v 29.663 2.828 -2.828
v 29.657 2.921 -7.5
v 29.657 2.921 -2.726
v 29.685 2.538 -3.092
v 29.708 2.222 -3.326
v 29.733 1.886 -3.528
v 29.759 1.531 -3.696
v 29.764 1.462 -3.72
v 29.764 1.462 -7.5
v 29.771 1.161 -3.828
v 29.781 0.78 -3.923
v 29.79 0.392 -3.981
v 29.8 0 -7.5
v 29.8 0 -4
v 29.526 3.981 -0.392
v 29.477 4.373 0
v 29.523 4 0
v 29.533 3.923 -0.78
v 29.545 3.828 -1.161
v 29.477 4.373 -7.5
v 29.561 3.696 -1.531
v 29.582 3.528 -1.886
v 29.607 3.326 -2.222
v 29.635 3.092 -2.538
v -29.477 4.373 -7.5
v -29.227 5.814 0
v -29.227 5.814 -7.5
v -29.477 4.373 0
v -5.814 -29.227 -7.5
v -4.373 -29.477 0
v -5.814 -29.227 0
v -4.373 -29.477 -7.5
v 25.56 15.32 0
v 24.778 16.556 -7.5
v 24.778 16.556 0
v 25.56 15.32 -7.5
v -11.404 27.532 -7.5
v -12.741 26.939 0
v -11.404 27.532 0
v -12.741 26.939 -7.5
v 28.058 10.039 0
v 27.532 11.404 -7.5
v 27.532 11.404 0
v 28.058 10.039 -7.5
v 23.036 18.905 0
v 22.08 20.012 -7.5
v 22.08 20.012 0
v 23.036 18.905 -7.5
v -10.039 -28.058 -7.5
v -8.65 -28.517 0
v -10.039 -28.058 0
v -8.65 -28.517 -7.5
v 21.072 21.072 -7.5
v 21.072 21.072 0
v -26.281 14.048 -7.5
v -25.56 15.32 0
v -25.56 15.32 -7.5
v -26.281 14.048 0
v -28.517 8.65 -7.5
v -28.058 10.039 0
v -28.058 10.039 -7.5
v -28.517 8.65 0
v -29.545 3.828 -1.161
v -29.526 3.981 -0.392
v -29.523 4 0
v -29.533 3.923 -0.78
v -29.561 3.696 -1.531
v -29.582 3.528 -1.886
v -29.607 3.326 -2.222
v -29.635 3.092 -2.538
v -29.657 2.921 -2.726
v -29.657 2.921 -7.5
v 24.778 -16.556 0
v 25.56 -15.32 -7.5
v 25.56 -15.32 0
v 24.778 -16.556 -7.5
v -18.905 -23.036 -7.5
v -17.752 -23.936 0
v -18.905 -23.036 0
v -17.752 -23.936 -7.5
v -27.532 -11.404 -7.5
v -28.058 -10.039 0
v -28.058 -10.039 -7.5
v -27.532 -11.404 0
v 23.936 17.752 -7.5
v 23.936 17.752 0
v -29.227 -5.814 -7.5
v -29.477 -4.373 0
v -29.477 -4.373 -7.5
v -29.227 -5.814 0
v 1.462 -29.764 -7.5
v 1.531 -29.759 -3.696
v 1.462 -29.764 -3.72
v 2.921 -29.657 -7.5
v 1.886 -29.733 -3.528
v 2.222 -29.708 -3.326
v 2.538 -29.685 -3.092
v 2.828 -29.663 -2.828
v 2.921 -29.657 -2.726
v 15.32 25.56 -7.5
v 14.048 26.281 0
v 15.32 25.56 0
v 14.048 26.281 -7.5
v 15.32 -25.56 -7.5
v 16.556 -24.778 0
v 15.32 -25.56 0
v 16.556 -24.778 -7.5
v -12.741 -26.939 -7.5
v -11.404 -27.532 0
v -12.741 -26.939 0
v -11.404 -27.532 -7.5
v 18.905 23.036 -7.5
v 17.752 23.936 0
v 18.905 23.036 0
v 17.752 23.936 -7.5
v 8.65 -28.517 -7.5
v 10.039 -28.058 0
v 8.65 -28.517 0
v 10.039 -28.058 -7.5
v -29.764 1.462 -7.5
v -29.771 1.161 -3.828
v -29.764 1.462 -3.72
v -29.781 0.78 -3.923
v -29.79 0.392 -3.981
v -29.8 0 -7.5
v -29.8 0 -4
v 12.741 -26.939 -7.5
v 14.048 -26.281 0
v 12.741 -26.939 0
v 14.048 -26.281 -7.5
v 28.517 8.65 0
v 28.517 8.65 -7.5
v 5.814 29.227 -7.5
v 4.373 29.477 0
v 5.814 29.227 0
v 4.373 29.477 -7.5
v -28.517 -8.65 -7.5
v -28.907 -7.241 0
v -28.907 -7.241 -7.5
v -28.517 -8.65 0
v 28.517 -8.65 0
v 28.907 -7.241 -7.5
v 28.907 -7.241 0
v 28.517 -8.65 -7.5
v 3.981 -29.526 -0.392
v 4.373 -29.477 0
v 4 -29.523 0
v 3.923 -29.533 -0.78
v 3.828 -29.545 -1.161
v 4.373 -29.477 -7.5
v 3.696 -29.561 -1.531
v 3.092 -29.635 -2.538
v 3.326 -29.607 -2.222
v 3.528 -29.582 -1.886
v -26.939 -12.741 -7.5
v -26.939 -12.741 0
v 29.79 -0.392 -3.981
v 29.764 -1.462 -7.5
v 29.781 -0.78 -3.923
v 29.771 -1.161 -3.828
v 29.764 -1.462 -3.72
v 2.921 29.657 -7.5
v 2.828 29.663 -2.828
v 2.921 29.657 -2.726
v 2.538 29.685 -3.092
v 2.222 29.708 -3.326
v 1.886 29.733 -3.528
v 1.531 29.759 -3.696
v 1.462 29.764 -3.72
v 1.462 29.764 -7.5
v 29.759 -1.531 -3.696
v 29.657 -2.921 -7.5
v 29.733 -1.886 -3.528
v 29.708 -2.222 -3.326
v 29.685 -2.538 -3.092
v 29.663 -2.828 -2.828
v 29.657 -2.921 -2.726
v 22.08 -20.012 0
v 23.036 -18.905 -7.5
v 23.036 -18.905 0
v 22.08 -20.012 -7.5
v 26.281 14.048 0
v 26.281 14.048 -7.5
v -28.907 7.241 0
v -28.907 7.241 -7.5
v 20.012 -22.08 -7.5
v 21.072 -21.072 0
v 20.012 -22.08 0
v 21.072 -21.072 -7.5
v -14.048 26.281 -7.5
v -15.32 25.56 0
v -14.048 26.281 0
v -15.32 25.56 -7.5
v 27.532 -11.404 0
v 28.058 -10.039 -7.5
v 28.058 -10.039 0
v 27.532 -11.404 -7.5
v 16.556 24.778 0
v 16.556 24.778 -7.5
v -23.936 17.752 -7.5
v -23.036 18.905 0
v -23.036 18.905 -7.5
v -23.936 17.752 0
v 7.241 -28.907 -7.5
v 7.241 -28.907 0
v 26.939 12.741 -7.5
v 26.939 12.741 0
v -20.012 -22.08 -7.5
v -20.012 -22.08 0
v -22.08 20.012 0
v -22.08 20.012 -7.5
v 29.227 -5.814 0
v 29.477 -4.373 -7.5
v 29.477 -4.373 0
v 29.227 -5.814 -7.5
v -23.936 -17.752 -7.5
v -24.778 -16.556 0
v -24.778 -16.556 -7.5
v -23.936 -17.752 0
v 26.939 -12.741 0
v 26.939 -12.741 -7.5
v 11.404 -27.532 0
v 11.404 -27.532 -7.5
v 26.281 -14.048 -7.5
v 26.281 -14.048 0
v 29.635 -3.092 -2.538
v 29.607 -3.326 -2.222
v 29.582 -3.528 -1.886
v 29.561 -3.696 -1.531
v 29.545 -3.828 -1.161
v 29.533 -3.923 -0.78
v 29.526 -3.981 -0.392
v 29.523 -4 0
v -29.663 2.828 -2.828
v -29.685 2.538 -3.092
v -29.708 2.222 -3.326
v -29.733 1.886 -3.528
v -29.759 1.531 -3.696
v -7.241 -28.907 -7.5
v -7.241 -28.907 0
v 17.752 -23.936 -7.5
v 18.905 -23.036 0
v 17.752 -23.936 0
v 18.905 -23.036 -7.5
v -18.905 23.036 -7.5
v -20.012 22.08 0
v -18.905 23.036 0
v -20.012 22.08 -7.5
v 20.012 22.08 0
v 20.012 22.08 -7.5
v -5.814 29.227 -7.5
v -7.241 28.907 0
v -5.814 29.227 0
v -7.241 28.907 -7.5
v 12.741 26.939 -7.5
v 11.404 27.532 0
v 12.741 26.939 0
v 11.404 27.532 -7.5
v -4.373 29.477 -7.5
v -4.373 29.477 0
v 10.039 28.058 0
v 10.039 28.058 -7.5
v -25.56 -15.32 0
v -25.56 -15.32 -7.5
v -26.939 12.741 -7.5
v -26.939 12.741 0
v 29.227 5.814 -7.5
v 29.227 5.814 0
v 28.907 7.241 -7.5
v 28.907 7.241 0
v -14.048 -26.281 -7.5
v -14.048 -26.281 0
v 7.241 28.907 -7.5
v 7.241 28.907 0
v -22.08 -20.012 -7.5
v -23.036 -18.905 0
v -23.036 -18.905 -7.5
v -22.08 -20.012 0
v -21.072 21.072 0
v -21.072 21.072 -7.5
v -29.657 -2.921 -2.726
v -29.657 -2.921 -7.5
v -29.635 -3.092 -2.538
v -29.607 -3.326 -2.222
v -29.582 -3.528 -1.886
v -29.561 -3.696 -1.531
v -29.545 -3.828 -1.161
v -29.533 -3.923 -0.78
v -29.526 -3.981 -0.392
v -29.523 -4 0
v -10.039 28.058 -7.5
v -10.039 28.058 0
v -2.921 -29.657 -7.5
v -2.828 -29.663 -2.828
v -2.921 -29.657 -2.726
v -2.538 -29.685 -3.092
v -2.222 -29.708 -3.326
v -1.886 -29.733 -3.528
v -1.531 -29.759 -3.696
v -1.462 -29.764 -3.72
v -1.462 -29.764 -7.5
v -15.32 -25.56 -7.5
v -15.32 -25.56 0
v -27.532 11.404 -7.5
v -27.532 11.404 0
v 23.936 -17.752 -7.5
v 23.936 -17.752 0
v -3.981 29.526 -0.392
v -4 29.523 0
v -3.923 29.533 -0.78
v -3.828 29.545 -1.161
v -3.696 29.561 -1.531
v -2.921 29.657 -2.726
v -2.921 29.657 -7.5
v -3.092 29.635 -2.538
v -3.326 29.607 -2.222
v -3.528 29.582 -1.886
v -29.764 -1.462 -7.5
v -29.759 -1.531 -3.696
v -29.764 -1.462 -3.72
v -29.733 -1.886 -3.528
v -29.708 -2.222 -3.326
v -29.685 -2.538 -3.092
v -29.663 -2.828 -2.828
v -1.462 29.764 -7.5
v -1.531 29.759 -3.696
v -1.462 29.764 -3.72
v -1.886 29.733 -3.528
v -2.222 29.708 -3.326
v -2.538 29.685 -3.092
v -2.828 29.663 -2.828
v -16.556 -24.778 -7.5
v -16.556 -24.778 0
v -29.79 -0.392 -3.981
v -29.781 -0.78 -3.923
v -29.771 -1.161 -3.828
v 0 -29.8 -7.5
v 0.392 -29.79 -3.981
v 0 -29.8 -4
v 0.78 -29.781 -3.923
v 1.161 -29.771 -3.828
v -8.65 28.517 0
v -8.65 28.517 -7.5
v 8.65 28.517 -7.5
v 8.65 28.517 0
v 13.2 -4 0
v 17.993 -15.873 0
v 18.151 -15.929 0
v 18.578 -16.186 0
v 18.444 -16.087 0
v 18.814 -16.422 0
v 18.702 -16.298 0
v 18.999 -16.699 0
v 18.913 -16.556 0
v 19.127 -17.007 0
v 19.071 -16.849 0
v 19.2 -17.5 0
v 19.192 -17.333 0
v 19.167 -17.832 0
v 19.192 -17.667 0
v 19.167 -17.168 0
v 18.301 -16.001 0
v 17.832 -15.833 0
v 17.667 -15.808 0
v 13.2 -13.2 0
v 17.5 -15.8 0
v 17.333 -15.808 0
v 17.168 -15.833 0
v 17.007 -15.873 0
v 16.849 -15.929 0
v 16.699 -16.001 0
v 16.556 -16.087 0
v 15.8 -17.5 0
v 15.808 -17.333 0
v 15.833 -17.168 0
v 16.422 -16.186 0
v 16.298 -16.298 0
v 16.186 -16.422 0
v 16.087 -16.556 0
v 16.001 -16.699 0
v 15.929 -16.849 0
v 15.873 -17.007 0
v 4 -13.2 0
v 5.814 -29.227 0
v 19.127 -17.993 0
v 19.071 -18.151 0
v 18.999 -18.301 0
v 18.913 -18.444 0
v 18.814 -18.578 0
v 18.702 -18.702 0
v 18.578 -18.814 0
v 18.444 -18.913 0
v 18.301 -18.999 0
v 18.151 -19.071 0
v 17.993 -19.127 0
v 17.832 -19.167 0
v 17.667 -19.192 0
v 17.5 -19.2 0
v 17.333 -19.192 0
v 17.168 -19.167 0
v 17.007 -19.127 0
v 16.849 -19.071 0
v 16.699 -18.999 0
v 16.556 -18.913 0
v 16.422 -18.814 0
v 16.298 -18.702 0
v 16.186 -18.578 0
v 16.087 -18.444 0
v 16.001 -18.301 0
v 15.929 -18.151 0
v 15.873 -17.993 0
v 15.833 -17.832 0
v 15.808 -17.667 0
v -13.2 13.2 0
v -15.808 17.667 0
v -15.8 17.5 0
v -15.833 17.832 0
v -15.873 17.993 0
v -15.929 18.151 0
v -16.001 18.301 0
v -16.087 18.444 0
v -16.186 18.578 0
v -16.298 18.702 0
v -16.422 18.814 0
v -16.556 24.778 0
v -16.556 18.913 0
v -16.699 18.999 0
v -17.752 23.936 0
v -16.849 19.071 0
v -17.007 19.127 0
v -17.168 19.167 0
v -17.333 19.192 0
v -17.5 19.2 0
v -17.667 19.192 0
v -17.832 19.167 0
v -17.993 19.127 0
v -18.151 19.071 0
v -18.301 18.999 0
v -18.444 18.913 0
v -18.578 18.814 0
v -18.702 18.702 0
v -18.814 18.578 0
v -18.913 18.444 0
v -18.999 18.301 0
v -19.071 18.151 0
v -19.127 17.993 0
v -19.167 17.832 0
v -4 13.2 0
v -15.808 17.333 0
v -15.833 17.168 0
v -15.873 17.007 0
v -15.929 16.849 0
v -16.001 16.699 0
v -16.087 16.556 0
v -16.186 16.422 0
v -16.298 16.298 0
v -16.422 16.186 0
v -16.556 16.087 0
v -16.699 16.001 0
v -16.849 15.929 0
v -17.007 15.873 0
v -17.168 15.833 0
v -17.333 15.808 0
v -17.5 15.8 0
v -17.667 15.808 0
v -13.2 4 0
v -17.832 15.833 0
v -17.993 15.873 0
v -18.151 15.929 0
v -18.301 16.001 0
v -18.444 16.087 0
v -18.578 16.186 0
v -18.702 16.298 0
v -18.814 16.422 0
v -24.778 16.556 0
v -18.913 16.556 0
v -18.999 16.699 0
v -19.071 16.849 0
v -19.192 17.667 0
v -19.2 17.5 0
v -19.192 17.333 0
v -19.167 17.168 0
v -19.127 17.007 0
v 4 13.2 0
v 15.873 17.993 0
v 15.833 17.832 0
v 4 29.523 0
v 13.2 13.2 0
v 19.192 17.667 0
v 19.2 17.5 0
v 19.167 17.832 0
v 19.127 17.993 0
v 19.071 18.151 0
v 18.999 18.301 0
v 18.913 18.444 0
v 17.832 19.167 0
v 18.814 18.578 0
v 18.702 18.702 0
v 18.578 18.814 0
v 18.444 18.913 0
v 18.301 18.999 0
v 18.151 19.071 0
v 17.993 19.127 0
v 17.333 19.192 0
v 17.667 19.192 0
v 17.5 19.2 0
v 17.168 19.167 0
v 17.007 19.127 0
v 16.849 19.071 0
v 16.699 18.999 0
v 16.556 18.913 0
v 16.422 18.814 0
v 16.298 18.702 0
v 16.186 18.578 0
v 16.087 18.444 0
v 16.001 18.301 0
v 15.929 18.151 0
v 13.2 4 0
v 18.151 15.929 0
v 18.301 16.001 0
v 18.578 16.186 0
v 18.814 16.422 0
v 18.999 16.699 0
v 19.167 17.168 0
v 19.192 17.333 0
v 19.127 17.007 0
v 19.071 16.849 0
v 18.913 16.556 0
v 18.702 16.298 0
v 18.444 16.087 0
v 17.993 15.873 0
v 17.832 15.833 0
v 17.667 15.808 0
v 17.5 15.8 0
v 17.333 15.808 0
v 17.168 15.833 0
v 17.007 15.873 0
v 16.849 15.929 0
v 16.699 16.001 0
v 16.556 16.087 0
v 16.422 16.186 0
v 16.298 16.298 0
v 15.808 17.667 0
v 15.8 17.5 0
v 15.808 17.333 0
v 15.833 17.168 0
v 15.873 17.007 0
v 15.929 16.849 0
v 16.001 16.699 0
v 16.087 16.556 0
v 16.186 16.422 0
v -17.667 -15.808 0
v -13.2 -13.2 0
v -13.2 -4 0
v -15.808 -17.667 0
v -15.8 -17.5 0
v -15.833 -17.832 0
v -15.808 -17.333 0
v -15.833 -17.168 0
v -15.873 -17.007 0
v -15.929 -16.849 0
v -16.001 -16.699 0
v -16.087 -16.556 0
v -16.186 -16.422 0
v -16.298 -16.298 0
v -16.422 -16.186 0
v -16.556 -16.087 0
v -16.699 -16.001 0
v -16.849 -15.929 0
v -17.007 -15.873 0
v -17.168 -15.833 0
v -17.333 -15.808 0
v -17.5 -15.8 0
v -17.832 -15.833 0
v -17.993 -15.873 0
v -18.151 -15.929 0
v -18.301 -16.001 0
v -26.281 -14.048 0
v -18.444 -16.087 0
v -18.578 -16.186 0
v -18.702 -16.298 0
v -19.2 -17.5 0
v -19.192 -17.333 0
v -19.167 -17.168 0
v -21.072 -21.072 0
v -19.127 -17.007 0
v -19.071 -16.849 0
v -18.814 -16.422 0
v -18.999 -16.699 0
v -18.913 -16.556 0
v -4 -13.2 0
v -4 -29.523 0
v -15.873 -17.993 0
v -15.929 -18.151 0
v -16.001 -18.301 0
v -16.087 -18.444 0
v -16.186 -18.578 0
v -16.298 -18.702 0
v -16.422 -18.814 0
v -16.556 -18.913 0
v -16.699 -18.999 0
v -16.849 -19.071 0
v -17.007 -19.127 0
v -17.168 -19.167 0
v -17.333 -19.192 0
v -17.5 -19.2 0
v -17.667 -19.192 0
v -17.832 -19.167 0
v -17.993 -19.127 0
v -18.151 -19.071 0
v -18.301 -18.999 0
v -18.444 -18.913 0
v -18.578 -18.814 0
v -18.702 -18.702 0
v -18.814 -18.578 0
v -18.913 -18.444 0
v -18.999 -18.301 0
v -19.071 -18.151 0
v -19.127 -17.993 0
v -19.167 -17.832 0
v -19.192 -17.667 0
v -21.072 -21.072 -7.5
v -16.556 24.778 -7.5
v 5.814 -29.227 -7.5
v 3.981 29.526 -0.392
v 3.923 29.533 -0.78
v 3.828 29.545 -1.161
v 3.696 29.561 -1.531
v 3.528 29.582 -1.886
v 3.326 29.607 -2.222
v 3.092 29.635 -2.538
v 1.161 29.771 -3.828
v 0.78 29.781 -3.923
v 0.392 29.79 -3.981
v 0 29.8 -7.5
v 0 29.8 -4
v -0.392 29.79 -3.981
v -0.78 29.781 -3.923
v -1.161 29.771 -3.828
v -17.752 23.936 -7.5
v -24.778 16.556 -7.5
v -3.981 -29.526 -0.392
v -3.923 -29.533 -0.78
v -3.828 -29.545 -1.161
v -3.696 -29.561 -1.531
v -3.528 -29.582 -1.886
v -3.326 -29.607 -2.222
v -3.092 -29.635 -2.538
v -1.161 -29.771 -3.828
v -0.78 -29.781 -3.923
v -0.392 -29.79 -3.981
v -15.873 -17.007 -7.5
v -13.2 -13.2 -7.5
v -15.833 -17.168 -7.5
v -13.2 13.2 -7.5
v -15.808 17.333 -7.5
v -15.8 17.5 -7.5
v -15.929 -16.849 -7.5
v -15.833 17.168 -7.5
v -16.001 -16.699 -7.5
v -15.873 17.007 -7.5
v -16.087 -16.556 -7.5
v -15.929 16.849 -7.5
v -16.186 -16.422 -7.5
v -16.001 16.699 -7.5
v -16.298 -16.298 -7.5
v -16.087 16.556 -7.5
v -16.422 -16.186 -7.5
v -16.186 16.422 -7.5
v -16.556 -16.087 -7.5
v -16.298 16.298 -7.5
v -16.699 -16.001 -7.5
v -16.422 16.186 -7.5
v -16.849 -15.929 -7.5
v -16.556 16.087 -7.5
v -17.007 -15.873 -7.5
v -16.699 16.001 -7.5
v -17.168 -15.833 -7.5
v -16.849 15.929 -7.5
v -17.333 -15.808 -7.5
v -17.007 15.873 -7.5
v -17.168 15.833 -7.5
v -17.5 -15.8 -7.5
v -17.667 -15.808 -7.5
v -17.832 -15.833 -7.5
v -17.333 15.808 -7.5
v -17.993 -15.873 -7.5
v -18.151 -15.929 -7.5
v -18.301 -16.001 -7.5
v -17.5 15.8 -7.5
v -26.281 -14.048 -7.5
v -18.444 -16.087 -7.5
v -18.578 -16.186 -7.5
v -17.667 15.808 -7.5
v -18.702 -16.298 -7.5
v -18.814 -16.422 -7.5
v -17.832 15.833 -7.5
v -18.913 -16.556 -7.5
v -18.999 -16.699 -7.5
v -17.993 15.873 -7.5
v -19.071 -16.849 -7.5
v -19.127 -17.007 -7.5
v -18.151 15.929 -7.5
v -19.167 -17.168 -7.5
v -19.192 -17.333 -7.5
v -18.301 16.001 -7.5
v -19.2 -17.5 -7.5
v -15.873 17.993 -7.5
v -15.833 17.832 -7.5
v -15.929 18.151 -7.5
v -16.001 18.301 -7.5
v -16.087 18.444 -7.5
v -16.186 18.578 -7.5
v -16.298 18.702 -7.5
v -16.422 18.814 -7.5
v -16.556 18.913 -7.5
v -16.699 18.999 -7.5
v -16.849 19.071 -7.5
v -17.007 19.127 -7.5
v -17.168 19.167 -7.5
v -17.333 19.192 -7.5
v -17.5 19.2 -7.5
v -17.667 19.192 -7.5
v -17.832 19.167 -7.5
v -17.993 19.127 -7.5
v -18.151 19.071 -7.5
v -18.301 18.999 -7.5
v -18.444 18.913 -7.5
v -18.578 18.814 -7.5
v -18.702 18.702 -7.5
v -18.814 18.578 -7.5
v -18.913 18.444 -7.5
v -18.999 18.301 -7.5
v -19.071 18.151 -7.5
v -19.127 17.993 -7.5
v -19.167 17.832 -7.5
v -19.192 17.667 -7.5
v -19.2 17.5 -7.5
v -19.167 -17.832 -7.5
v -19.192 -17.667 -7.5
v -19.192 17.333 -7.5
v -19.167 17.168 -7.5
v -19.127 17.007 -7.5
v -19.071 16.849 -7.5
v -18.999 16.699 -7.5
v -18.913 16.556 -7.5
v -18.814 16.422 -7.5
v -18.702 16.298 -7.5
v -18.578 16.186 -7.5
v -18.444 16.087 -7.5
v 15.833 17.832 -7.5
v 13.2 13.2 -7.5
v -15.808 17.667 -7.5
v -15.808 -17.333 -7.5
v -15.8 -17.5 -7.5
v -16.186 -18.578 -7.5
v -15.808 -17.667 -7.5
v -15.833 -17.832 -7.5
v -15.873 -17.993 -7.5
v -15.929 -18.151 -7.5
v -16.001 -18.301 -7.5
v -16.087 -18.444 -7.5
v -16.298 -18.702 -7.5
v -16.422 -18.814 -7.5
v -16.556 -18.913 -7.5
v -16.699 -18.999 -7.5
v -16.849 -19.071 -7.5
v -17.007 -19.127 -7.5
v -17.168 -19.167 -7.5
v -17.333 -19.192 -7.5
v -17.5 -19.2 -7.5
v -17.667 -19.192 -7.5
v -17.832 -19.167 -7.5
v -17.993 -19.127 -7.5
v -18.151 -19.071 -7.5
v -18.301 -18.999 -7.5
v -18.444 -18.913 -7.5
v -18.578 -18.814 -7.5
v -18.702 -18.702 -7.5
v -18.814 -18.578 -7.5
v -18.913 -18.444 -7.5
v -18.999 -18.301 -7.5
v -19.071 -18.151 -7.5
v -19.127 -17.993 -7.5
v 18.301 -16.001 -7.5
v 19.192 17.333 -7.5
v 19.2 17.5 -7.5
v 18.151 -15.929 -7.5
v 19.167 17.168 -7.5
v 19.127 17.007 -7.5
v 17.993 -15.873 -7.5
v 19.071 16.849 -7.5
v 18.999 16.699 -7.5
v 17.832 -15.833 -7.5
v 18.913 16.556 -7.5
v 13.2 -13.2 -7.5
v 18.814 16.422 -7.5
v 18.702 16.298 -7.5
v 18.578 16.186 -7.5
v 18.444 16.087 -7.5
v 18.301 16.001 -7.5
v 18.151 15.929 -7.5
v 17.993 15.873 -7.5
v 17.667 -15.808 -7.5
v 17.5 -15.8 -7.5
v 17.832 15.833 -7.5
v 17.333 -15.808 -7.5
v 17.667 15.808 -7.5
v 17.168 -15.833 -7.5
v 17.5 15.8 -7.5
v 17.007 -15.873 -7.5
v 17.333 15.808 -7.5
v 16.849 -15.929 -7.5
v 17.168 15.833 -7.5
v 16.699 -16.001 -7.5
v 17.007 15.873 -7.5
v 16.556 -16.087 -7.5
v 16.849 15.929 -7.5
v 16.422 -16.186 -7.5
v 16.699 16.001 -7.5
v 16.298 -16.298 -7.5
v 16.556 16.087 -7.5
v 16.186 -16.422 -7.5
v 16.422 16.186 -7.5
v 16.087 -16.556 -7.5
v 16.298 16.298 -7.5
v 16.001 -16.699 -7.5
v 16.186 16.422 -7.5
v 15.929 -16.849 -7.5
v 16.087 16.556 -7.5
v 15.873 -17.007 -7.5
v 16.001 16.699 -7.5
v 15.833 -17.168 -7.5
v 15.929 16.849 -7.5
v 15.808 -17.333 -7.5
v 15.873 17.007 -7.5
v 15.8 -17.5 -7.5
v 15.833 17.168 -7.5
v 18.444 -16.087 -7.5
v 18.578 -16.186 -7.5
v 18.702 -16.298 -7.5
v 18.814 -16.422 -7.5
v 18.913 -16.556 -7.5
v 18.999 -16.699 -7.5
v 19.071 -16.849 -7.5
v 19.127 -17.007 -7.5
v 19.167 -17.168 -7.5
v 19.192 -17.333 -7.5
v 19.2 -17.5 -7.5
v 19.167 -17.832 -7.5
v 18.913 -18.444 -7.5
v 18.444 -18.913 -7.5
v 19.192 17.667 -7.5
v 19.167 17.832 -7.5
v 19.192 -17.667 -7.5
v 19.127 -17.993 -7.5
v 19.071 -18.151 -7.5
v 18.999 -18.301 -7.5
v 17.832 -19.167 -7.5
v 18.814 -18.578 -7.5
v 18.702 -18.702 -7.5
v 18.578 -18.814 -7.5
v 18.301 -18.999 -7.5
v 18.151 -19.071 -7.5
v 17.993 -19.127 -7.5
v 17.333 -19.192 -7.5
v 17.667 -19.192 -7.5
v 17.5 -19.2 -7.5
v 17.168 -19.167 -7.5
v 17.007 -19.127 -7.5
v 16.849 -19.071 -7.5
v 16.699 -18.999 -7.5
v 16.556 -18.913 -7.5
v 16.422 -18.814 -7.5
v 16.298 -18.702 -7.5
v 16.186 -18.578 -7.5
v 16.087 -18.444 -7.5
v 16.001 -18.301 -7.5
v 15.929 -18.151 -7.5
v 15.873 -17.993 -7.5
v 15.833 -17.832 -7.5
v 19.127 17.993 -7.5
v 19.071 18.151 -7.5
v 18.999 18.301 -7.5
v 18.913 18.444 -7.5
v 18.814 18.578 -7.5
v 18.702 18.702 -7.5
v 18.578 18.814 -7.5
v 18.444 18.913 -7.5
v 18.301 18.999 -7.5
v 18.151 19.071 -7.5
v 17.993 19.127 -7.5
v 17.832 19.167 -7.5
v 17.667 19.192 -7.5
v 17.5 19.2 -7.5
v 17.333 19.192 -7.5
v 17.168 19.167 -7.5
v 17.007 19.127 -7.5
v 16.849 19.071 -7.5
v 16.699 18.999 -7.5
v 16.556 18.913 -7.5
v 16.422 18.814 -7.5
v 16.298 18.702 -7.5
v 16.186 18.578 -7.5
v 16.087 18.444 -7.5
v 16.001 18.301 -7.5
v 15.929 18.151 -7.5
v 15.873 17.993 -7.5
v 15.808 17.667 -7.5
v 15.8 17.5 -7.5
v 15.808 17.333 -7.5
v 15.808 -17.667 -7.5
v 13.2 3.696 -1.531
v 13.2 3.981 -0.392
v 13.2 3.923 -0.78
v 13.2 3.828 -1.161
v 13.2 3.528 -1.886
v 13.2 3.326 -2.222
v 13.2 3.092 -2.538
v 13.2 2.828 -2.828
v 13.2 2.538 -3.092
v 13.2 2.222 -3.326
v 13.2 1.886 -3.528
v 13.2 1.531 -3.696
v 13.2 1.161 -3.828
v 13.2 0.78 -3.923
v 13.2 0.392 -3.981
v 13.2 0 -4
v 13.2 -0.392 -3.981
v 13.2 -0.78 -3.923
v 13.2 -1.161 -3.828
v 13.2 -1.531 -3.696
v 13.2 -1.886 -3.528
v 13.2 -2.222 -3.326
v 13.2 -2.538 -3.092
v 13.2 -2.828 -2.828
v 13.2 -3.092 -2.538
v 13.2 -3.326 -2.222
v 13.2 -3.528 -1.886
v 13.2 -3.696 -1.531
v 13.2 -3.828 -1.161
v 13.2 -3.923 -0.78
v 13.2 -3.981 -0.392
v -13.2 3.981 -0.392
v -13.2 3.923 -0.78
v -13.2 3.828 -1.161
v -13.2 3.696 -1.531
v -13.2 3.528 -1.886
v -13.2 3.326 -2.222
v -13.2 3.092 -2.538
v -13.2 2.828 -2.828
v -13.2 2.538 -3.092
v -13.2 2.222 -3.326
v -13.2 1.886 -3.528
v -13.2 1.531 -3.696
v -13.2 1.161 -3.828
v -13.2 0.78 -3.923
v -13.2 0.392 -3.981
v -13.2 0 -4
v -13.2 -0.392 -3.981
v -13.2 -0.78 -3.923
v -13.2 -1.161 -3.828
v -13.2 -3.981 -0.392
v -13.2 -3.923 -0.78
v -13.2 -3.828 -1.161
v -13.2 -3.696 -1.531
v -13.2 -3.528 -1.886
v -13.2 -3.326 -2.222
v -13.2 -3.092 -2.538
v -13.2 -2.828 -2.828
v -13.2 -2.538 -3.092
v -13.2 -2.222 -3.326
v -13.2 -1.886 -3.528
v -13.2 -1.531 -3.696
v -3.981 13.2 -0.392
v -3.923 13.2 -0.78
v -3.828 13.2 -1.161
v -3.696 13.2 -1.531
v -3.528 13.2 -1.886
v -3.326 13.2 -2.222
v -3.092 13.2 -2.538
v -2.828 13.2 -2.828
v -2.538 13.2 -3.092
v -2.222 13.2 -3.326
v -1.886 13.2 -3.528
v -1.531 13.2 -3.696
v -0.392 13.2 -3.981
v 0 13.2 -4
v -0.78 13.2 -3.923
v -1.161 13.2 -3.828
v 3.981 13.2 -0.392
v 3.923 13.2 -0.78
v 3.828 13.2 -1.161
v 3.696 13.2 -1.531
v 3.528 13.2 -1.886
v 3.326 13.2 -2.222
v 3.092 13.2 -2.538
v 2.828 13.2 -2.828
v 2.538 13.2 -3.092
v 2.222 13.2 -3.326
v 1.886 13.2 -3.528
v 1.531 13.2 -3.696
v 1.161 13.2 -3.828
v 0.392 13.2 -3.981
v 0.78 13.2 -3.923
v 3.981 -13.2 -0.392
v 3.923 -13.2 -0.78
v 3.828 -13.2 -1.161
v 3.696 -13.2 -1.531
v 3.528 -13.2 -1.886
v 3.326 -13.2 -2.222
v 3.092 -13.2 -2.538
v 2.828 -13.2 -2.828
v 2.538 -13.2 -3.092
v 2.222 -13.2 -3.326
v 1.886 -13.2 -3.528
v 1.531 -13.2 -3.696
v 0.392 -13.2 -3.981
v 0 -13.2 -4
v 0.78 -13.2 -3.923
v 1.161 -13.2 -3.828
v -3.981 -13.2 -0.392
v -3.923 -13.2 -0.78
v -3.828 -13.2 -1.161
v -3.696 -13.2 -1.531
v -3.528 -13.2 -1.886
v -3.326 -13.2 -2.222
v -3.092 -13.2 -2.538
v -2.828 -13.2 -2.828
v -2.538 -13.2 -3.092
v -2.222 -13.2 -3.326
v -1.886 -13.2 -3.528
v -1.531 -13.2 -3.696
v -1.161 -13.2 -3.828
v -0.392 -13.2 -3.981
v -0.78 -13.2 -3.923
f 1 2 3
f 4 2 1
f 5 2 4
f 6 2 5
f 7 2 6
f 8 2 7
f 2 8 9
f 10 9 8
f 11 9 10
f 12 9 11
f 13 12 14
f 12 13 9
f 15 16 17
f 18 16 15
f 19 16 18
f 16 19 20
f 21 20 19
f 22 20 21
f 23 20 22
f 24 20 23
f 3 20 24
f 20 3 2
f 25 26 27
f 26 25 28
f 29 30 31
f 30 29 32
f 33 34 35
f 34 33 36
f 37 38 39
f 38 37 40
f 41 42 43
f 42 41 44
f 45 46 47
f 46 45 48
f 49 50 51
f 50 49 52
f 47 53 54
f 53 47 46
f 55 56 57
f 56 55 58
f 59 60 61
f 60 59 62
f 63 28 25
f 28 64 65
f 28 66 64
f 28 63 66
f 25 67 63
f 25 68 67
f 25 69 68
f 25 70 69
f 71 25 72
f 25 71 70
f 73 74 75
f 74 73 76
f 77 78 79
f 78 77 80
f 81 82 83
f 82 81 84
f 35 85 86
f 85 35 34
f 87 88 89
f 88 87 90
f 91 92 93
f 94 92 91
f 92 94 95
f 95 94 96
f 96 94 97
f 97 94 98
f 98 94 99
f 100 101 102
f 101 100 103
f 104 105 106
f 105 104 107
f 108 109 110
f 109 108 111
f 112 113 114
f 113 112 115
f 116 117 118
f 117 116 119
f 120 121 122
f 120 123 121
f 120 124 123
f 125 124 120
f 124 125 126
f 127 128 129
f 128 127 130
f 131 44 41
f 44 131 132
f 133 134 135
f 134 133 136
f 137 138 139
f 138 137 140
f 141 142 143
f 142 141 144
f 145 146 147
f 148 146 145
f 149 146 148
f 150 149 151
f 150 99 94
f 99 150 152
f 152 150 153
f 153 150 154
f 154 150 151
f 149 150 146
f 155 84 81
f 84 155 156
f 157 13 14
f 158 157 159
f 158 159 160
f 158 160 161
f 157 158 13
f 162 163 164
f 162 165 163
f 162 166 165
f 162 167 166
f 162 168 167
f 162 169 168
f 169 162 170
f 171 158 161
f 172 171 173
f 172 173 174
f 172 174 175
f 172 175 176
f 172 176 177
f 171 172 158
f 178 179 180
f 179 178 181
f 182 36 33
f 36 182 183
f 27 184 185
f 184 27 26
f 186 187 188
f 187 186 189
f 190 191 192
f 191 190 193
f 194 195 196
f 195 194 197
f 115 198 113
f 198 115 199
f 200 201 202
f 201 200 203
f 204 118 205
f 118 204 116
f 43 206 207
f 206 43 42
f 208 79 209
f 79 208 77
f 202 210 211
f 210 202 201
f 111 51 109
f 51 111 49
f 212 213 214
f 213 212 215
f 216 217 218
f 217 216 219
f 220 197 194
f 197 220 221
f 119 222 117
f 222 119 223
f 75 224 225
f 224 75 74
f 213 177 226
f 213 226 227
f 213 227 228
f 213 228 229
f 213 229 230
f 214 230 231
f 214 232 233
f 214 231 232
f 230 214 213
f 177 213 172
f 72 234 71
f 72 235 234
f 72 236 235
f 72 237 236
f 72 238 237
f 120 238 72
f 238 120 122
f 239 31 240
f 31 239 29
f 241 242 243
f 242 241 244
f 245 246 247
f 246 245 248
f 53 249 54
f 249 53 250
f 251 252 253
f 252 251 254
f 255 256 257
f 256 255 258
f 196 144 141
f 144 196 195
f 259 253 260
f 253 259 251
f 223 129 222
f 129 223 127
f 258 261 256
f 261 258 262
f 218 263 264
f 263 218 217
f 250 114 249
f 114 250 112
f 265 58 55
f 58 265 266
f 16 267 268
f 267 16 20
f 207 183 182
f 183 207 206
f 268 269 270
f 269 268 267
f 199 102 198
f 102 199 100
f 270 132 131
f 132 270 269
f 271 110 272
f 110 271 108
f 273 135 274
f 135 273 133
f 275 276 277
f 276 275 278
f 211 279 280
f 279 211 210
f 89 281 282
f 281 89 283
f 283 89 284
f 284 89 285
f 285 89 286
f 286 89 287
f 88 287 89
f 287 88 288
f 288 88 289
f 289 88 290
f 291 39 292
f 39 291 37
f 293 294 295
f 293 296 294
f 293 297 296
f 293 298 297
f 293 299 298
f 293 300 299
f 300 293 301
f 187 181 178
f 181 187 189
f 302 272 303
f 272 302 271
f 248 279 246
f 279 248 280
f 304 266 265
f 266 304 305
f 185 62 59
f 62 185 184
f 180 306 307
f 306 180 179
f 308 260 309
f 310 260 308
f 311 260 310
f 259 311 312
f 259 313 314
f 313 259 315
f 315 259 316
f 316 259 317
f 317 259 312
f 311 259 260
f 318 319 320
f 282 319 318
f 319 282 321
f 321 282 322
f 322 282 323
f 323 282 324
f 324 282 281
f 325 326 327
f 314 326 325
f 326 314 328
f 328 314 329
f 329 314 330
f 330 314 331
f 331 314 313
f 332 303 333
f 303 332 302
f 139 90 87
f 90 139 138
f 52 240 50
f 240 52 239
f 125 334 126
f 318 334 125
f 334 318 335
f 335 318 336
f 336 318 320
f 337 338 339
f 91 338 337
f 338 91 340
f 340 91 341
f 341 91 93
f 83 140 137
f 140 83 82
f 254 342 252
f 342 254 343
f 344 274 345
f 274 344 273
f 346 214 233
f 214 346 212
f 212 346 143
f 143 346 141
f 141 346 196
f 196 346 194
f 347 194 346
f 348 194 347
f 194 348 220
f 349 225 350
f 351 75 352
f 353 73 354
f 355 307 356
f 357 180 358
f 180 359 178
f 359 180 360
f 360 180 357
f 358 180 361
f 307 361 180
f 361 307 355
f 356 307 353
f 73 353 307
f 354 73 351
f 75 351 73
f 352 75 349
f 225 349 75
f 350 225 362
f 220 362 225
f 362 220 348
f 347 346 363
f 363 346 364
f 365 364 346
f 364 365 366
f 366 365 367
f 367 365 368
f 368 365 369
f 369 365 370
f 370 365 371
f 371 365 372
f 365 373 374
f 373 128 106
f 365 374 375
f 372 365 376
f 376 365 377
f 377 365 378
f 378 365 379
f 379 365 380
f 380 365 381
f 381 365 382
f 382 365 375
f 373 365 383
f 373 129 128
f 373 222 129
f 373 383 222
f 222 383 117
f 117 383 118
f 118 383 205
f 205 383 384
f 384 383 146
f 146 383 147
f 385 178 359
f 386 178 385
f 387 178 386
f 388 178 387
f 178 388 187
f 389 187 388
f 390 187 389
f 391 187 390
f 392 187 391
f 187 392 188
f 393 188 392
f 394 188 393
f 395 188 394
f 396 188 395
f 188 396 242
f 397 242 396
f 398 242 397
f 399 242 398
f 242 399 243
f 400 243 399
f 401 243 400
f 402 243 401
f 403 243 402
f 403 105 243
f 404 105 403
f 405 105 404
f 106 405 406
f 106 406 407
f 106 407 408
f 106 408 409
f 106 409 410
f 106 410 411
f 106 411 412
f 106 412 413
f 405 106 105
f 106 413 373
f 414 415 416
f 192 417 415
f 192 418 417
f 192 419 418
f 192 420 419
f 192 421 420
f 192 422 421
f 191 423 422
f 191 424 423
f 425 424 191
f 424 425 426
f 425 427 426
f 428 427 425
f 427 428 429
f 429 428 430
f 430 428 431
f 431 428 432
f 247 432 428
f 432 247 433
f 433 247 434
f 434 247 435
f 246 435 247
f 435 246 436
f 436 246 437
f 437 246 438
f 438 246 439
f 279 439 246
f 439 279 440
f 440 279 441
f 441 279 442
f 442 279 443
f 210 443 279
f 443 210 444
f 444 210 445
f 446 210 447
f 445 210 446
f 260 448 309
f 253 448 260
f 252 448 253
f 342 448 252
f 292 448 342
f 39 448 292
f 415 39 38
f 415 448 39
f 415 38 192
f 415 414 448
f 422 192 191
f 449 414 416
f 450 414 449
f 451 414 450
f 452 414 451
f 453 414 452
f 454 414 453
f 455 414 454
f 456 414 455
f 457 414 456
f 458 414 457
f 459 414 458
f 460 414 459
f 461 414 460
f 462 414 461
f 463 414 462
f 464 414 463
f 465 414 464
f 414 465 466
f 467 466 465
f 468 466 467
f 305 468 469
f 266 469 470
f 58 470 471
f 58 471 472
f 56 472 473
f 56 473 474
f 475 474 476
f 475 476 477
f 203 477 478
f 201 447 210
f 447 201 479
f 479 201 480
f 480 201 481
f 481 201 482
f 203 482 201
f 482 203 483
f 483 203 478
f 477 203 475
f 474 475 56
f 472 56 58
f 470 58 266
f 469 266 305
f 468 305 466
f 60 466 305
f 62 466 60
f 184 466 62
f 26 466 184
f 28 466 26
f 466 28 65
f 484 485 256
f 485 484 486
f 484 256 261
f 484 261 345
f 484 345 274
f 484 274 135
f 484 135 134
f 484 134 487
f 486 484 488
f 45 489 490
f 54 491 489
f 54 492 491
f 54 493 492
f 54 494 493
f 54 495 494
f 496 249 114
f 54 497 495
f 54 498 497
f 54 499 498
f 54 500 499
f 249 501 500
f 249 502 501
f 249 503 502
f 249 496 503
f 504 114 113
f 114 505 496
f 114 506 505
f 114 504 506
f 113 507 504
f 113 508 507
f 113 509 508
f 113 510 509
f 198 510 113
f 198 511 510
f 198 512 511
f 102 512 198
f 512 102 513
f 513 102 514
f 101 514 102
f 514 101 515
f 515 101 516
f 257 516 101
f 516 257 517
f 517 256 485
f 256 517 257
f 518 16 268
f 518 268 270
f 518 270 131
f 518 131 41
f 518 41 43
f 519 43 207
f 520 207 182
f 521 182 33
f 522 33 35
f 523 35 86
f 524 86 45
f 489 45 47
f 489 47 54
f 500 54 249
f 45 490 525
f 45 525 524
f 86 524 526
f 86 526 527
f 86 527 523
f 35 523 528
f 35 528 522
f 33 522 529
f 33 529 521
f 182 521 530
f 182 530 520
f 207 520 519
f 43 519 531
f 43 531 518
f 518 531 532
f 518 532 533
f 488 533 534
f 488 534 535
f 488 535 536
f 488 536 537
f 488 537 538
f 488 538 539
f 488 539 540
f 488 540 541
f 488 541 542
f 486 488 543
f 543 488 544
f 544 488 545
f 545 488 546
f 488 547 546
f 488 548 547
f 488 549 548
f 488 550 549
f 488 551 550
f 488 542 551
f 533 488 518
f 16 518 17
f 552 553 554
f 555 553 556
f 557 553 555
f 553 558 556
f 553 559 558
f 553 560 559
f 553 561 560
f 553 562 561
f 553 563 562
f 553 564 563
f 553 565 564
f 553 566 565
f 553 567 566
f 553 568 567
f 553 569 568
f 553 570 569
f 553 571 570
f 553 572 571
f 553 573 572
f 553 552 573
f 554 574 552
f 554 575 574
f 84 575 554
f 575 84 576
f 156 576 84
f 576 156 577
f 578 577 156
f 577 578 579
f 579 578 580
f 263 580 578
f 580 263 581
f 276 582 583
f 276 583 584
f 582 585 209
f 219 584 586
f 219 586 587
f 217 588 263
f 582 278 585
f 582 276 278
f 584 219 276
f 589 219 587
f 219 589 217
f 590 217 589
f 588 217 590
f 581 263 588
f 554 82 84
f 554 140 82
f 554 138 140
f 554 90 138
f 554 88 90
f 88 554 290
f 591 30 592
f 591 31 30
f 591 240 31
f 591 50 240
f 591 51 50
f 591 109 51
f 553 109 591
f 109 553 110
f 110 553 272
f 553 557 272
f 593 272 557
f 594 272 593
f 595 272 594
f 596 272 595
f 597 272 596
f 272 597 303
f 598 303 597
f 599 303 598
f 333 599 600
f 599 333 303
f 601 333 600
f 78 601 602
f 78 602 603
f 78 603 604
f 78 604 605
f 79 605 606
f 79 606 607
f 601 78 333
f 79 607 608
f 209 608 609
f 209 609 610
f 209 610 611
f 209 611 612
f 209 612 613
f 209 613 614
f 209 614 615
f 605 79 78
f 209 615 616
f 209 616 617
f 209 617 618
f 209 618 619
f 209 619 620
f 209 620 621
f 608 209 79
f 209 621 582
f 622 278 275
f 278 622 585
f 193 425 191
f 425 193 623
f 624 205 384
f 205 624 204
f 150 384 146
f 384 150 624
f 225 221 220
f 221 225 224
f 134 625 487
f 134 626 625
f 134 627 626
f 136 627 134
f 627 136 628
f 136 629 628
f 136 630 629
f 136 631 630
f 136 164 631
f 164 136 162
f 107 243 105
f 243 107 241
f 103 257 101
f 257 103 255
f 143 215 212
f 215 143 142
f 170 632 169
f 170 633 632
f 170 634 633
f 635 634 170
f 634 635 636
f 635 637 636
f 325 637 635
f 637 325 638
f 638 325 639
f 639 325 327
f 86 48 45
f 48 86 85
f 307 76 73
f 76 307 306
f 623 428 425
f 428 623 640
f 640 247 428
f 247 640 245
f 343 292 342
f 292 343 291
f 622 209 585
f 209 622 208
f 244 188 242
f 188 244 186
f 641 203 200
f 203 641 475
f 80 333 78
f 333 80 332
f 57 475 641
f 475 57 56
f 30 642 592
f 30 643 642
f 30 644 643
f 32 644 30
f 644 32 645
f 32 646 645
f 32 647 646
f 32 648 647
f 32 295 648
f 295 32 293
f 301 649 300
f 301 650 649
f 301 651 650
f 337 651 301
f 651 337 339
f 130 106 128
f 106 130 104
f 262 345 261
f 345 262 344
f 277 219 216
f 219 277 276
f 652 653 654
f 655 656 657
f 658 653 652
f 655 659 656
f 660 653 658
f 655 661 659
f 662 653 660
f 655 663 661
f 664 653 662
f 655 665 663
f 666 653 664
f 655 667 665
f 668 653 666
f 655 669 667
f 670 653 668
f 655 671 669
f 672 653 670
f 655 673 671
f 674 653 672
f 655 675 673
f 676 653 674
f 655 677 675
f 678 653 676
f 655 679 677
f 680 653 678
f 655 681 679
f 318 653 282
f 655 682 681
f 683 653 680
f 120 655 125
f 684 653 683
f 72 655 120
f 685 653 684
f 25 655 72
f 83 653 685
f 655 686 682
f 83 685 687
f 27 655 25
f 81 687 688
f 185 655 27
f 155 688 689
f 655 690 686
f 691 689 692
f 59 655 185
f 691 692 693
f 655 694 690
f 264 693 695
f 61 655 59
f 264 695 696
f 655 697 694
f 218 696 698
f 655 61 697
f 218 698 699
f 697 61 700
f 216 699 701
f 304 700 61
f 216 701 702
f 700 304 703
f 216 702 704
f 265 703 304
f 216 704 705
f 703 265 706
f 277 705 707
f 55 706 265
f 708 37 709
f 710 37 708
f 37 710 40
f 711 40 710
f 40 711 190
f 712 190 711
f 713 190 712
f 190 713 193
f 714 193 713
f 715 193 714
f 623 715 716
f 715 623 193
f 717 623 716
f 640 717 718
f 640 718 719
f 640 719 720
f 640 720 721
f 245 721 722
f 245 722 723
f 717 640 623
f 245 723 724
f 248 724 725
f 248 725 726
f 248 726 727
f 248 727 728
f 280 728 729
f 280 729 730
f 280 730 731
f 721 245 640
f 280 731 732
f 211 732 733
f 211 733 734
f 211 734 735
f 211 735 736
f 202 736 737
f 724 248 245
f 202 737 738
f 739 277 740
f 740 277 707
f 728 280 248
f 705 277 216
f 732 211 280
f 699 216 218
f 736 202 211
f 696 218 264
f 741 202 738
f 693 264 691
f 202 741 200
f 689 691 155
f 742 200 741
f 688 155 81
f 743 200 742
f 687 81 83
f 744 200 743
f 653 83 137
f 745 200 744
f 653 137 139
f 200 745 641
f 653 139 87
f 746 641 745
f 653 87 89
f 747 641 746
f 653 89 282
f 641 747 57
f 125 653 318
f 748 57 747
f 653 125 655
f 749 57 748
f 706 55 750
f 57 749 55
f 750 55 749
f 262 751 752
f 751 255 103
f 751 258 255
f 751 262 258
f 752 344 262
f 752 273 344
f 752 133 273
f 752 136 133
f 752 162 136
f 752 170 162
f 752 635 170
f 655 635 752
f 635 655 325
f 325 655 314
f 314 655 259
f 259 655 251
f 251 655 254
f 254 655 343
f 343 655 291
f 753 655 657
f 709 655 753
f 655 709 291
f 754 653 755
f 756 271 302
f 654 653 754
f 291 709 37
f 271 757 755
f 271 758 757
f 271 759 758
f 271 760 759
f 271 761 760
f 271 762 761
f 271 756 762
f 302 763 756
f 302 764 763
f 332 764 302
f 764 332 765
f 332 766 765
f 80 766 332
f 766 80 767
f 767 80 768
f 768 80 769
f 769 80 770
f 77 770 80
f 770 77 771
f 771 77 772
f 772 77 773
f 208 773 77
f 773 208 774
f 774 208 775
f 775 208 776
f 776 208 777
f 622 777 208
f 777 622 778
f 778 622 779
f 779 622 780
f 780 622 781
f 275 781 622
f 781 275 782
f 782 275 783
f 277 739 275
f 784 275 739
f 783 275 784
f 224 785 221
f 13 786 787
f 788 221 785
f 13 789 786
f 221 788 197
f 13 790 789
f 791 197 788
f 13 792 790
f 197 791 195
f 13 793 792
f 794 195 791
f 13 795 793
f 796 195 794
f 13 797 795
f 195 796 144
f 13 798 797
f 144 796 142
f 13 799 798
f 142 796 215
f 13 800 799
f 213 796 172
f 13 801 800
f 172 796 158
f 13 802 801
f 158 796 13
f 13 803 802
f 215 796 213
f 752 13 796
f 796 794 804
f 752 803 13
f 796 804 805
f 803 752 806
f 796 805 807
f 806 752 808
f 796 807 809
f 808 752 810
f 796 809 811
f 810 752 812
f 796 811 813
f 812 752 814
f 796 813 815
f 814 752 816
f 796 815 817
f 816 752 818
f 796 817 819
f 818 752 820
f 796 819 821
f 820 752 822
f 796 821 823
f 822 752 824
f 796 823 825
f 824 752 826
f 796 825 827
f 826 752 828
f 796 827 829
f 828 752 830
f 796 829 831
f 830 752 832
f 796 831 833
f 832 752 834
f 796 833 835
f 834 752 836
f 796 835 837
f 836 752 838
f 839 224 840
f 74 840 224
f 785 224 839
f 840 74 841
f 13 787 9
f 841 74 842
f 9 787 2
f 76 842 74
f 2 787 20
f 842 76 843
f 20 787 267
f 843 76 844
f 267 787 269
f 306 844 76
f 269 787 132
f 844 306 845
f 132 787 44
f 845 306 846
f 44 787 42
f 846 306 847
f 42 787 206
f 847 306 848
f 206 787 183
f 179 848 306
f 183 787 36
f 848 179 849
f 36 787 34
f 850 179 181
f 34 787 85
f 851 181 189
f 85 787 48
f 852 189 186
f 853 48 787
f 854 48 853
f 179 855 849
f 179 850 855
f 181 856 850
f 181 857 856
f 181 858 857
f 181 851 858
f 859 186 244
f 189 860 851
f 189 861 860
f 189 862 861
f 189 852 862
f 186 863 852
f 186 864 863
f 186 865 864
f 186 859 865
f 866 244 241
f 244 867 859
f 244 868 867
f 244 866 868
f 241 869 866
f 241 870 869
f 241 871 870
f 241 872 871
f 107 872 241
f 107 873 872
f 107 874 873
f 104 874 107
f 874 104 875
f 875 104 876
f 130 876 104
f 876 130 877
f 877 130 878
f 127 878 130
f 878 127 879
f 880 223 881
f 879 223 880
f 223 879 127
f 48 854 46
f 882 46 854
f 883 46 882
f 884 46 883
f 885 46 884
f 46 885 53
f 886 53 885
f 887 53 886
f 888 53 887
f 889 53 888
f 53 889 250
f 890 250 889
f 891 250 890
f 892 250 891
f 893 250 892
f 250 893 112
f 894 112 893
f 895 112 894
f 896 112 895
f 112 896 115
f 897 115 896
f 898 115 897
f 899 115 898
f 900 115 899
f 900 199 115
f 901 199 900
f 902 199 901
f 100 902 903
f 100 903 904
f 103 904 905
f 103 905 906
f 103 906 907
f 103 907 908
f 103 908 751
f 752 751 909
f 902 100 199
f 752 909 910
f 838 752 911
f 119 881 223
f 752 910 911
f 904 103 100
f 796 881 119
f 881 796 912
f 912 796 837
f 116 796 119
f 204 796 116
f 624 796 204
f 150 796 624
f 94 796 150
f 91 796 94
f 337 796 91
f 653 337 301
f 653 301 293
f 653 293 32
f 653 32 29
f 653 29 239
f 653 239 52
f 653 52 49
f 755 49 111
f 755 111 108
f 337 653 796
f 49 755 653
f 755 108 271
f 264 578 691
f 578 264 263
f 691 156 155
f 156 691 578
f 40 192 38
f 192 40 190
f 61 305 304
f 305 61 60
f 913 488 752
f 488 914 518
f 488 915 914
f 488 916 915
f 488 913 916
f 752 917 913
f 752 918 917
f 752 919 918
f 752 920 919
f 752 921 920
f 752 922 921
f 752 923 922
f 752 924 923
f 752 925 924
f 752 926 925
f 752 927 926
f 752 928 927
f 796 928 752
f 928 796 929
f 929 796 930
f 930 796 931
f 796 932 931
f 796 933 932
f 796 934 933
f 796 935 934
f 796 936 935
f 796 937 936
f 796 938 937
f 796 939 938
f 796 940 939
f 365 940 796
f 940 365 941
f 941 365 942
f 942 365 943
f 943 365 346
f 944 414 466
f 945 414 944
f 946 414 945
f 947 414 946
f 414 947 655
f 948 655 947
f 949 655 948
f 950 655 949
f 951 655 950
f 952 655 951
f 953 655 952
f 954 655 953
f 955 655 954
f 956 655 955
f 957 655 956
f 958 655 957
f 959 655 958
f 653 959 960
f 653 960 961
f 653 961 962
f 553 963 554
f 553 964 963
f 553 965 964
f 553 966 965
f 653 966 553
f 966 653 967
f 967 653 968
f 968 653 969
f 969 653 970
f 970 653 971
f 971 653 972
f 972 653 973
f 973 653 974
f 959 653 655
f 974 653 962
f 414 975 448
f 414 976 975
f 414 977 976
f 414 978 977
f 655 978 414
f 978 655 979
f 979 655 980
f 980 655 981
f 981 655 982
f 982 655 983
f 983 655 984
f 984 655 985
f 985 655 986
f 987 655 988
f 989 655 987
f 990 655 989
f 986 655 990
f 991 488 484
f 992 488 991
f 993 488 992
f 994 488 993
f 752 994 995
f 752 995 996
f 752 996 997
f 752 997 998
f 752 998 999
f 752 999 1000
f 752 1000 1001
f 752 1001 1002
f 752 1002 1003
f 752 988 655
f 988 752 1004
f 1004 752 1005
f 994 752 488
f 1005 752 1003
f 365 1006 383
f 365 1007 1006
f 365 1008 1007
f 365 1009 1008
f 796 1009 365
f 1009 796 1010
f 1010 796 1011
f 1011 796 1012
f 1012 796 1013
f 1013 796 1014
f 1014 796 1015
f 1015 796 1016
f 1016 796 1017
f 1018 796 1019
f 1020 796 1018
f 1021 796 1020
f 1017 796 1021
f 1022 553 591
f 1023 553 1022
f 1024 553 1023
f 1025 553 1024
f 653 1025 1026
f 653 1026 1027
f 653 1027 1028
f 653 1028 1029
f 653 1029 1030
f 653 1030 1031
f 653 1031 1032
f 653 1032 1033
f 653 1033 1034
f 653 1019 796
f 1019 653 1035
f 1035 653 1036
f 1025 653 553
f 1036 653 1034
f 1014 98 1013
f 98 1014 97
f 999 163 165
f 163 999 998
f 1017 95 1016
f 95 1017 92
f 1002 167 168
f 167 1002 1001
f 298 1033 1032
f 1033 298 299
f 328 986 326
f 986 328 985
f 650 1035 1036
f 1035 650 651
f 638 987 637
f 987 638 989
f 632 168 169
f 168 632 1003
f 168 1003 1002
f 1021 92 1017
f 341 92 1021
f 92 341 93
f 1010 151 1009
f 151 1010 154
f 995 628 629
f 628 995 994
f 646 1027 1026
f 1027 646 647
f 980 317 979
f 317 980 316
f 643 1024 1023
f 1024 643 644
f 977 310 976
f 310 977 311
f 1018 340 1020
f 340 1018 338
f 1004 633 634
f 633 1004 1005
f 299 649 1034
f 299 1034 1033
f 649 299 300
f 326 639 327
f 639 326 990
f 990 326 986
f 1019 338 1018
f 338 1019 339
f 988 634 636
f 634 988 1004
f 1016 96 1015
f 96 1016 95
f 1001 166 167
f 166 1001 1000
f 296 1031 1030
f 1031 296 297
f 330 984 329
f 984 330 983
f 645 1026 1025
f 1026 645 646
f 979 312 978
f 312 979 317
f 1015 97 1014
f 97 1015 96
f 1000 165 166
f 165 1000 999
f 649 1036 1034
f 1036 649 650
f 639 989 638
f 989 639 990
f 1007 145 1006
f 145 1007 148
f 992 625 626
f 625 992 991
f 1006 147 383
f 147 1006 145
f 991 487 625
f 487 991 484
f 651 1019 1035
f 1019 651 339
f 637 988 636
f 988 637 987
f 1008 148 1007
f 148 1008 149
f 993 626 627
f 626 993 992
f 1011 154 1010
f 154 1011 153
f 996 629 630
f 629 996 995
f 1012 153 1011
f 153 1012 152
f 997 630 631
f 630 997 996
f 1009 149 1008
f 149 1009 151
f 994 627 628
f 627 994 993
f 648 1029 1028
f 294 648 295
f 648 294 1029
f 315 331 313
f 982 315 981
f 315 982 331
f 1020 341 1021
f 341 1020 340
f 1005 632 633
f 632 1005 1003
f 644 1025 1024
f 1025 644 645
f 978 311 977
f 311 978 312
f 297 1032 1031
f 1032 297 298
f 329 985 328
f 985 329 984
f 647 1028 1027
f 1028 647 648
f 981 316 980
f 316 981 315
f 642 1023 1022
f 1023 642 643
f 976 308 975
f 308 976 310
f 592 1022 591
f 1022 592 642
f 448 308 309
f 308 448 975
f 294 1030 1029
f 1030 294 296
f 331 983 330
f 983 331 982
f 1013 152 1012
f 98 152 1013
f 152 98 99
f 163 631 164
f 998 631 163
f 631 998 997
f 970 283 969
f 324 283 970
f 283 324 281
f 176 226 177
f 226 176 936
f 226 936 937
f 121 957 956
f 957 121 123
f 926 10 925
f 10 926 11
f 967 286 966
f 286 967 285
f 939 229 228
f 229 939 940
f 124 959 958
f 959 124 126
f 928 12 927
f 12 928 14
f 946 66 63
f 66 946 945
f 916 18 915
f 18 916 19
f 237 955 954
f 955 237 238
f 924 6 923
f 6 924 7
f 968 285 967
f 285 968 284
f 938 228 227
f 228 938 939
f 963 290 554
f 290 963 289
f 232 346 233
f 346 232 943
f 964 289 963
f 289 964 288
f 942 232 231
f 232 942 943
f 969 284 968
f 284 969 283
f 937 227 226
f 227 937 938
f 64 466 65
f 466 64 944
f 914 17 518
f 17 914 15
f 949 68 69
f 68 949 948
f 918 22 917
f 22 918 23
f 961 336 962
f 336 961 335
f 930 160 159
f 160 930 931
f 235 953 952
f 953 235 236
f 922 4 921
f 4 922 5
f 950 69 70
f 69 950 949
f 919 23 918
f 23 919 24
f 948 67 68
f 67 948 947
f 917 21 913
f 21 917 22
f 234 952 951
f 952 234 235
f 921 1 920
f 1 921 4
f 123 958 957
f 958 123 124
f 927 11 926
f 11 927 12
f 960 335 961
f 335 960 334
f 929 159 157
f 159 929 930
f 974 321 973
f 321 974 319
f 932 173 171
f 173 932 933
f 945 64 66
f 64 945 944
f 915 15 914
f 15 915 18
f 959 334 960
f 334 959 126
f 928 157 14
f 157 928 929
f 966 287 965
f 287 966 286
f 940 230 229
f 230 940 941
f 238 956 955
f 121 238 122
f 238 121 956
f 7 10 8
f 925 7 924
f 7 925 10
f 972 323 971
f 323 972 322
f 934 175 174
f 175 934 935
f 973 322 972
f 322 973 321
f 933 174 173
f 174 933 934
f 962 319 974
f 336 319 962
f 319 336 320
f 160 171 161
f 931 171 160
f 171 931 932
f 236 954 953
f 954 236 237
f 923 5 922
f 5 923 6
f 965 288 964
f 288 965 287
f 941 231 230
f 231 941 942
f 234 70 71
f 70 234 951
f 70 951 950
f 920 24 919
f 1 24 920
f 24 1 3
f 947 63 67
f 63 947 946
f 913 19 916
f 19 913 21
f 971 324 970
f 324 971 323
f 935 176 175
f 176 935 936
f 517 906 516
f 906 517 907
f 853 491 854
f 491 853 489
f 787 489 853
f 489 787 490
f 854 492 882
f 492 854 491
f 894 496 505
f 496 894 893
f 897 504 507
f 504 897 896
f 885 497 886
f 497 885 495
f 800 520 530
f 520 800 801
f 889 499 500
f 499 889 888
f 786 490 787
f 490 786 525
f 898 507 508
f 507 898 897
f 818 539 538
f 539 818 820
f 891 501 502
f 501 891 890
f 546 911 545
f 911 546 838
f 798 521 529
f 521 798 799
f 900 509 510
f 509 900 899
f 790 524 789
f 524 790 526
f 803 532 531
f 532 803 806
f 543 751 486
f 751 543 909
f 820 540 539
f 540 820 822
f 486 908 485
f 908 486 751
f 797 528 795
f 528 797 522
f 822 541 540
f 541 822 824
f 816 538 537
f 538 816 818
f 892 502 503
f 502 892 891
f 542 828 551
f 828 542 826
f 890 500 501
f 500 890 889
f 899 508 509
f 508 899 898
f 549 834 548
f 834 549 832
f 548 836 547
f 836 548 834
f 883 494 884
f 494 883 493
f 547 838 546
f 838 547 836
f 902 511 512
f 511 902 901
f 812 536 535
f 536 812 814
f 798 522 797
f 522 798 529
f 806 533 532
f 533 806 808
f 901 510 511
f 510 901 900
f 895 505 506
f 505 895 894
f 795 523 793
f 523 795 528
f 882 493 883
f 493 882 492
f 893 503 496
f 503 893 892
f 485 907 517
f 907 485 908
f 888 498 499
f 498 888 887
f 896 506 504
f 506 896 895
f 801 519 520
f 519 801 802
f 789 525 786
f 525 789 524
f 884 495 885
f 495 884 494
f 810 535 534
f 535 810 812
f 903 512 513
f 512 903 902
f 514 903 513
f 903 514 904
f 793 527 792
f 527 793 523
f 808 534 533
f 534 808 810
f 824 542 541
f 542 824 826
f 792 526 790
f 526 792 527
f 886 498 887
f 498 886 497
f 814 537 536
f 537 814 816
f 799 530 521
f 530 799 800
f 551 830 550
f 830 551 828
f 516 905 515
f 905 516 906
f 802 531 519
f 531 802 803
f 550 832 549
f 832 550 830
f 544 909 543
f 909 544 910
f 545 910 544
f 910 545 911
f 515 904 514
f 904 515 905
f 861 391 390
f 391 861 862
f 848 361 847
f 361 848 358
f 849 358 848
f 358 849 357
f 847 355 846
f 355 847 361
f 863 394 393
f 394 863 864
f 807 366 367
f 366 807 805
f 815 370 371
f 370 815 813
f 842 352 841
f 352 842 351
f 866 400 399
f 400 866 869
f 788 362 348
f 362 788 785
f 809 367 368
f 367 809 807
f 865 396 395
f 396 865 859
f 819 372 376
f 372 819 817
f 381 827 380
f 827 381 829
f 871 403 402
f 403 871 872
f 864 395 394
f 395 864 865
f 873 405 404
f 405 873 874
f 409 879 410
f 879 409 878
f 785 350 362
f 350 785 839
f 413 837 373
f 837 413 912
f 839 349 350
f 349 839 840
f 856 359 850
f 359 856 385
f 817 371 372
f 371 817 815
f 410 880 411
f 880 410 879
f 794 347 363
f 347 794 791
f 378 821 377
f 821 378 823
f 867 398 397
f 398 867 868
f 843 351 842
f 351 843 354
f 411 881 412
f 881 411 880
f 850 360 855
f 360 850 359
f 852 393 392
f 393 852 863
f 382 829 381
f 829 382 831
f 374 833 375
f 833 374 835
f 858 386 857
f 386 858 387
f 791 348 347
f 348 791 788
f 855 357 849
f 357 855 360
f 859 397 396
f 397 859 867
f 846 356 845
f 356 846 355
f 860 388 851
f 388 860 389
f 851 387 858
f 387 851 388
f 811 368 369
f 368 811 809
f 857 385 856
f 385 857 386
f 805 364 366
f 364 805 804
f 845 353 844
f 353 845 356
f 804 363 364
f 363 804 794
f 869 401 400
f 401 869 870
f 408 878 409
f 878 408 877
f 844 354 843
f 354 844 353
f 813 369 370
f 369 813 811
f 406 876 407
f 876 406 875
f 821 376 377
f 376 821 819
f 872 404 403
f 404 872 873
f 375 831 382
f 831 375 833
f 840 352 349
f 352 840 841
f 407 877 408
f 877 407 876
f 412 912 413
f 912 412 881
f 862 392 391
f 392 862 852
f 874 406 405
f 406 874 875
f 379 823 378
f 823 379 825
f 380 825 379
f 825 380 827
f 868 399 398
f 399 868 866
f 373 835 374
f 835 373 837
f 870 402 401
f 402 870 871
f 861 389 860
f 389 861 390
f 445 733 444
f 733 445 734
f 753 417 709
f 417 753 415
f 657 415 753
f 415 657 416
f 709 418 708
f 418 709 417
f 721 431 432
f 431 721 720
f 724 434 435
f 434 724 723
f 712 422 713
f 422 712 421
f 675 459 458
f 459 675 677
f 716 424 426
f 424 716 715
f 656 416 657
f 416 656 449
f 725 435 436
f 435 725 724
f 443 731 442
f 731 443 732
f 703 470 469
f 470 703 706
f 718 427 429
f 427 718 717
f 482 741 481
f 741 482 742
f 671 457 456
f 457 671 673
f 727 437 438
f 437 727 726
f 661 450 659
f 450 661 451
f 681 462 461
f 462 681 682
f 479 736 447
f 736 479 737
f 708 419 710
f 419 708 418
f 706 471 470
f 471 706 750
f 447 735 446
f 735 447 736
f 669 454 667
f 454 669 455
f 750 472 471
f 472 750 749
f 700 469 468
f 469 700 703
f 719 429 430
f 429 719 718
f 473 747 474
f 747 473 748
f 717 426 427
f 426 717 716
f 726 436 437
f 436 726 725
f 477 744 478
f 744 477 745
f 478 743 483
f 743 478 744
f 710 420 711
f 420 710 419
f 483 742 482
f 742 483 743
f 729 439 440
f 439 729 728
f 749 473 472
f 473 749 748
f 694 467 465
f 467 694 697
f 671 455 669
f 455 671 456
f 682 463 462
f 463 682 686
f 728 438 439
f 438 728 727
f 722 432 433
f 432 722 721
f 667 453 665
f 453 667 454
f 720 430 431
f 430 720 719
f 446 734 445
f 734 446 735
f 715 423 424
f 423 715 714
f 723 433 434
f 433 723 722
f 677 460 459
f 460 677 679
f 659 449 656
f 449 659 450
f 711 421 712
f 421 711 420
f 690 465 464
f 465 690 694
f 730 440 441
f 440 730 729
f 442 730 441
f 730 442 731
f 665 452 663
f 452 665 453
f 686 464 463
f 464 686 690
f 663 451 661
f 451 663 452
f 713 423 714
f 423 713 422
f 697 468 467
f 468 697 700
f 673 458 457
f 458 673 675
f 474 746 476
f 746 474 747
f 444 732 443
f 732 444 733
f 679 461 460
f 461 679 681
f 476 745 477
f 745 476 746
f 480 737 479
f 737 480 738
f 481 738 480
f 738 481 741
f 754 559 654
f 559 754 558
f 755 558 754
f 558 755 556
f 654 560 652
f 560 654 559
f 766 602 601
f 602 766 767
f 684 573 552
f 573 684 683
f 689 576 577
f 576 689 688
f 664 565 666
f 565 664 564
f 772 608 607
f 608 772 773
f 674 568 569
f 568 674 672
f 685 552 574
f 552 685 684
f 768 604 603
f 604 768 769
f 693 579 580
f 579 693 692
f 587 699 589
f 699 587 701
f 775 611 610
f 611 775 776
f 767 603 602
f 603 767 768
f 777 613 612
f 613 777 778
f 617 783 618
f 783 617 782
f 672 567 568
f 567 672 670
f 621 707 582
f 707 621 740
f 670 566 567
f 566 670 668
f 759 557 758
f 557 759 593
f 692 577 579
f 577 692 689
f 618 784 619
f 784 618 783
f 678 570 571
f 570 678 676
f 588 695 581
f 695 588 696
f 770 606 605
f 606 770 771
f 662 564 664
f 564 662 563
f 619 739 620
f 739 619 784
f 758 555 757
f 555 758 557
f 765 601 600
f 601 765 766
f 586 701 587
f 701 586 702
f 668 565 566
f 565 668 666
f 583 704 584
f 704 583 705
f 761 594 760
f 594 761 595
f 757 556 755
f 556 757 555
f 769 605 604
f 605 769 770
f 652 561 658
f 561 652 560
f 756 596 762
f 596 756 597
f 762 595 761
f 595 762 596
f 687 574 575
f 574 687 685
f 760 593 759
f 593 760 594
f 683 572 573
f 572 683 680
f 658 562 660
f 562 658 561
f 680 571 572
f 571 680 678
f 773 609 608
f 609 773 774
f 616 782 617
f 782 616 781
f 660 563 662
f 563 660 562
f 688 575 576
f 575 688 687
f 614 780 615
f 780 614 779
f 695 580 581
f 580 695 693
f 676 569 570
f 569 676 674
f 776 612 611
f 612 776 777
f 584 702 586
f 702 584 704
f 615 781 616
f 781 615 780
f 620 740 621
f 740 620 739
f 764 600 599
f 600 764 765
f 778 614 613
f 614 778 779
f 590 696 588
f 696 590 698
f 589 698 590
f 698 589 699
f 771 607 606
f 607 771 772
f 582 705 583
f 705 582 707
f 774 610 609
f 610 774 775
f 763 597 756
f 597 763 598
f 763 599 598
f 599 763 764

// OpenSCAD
ModuleD = 60;
ModuleZSize = 15;
AluSizeX = 25;
AluSizeY = 25;
DrillGuideD = 8;
AluClearance = 0.5;
BoltXDist = 35;
BoltYDist = 35;
BoltDiameter = 3;
PrintSizeAdjust = 0.4;


/*
ModuleD = 40;
ModuleZSize = 10;
AluSizeX = 10;
AluSizeY = 10;
DrillGuideD = 4.8;
AluClearance = 0.5;
BoltXDist = 20;
BoltYDist = 20;
BoltDiameter = 3;
PrintSizeAdjust = 0.4;
*/


DrillGuideModule(  ModuleD,
                   ModuleZSize,
                   AluSizeX,
                   AluSizeY,
                   DrillGuideD,
                   AluClearance,
                   BoltXDist,
                   BoltYDist,
                   BoltDiameter,
                   PrintSizeAdjust  );

module DrillGuideModule(moduleD,
                        moduleZSize,
                        aluSizeX,
                        aluSizeY,
                        drillGuideD,
                        aluClearance,
                        boltXDist,
                        boltYDist,
                        boltDiameter,
                        printSizeAdjust  )
{
    difference()
    {
        translate([0,0,-0.5*moduleZSize])
        cylinder(d=moduleD-printSizeAdjust, h=0.5*moduleZSize,$fn=128);
        cube([  AluSizeX+2*AluClearance+printSizeAdjust,
                AluSizeY+2*AluClearance+printSizeAdjust,
                moduleZSize+2], center=true);
        rotate([90,0,0])
        cylinder(d=drillGuideD, h=1.1*moduleD, center=true, $fn=64);
        rotate([0,90,0])
        cylinder(d=drillGuideD, h=1.1*moduleD, center=true, $fn=64);
        BoltCut(0.5*boltXDist, 0.5*boltYDist, boltDiameter+printSizeAdjust, moduleZSize);
        BoltCut(0.5*boltXDist, -0.5*boltYDist, boltDiameter+printSizeAdjust, moduleZSize);
        BoltCut(-0.5*boltXDist, 0.5*boltYDist, boltDiameter+printSizeAdjust, moduleZSize);
        BoltCut(-0.5*boltXDist, -0.5*boltYDist, boltDiameter+printSizeAdjust, moduleZSize);
        
    }
}

module BoltCut(xPos, yPos, cutDiameter, sizeZ)
{
    translate([xPos, yPos, -0.5*sizeZ-1])
    cylinder(d=cutDiameter, h=0.5*sizeZ+2, $fn=64);
}
